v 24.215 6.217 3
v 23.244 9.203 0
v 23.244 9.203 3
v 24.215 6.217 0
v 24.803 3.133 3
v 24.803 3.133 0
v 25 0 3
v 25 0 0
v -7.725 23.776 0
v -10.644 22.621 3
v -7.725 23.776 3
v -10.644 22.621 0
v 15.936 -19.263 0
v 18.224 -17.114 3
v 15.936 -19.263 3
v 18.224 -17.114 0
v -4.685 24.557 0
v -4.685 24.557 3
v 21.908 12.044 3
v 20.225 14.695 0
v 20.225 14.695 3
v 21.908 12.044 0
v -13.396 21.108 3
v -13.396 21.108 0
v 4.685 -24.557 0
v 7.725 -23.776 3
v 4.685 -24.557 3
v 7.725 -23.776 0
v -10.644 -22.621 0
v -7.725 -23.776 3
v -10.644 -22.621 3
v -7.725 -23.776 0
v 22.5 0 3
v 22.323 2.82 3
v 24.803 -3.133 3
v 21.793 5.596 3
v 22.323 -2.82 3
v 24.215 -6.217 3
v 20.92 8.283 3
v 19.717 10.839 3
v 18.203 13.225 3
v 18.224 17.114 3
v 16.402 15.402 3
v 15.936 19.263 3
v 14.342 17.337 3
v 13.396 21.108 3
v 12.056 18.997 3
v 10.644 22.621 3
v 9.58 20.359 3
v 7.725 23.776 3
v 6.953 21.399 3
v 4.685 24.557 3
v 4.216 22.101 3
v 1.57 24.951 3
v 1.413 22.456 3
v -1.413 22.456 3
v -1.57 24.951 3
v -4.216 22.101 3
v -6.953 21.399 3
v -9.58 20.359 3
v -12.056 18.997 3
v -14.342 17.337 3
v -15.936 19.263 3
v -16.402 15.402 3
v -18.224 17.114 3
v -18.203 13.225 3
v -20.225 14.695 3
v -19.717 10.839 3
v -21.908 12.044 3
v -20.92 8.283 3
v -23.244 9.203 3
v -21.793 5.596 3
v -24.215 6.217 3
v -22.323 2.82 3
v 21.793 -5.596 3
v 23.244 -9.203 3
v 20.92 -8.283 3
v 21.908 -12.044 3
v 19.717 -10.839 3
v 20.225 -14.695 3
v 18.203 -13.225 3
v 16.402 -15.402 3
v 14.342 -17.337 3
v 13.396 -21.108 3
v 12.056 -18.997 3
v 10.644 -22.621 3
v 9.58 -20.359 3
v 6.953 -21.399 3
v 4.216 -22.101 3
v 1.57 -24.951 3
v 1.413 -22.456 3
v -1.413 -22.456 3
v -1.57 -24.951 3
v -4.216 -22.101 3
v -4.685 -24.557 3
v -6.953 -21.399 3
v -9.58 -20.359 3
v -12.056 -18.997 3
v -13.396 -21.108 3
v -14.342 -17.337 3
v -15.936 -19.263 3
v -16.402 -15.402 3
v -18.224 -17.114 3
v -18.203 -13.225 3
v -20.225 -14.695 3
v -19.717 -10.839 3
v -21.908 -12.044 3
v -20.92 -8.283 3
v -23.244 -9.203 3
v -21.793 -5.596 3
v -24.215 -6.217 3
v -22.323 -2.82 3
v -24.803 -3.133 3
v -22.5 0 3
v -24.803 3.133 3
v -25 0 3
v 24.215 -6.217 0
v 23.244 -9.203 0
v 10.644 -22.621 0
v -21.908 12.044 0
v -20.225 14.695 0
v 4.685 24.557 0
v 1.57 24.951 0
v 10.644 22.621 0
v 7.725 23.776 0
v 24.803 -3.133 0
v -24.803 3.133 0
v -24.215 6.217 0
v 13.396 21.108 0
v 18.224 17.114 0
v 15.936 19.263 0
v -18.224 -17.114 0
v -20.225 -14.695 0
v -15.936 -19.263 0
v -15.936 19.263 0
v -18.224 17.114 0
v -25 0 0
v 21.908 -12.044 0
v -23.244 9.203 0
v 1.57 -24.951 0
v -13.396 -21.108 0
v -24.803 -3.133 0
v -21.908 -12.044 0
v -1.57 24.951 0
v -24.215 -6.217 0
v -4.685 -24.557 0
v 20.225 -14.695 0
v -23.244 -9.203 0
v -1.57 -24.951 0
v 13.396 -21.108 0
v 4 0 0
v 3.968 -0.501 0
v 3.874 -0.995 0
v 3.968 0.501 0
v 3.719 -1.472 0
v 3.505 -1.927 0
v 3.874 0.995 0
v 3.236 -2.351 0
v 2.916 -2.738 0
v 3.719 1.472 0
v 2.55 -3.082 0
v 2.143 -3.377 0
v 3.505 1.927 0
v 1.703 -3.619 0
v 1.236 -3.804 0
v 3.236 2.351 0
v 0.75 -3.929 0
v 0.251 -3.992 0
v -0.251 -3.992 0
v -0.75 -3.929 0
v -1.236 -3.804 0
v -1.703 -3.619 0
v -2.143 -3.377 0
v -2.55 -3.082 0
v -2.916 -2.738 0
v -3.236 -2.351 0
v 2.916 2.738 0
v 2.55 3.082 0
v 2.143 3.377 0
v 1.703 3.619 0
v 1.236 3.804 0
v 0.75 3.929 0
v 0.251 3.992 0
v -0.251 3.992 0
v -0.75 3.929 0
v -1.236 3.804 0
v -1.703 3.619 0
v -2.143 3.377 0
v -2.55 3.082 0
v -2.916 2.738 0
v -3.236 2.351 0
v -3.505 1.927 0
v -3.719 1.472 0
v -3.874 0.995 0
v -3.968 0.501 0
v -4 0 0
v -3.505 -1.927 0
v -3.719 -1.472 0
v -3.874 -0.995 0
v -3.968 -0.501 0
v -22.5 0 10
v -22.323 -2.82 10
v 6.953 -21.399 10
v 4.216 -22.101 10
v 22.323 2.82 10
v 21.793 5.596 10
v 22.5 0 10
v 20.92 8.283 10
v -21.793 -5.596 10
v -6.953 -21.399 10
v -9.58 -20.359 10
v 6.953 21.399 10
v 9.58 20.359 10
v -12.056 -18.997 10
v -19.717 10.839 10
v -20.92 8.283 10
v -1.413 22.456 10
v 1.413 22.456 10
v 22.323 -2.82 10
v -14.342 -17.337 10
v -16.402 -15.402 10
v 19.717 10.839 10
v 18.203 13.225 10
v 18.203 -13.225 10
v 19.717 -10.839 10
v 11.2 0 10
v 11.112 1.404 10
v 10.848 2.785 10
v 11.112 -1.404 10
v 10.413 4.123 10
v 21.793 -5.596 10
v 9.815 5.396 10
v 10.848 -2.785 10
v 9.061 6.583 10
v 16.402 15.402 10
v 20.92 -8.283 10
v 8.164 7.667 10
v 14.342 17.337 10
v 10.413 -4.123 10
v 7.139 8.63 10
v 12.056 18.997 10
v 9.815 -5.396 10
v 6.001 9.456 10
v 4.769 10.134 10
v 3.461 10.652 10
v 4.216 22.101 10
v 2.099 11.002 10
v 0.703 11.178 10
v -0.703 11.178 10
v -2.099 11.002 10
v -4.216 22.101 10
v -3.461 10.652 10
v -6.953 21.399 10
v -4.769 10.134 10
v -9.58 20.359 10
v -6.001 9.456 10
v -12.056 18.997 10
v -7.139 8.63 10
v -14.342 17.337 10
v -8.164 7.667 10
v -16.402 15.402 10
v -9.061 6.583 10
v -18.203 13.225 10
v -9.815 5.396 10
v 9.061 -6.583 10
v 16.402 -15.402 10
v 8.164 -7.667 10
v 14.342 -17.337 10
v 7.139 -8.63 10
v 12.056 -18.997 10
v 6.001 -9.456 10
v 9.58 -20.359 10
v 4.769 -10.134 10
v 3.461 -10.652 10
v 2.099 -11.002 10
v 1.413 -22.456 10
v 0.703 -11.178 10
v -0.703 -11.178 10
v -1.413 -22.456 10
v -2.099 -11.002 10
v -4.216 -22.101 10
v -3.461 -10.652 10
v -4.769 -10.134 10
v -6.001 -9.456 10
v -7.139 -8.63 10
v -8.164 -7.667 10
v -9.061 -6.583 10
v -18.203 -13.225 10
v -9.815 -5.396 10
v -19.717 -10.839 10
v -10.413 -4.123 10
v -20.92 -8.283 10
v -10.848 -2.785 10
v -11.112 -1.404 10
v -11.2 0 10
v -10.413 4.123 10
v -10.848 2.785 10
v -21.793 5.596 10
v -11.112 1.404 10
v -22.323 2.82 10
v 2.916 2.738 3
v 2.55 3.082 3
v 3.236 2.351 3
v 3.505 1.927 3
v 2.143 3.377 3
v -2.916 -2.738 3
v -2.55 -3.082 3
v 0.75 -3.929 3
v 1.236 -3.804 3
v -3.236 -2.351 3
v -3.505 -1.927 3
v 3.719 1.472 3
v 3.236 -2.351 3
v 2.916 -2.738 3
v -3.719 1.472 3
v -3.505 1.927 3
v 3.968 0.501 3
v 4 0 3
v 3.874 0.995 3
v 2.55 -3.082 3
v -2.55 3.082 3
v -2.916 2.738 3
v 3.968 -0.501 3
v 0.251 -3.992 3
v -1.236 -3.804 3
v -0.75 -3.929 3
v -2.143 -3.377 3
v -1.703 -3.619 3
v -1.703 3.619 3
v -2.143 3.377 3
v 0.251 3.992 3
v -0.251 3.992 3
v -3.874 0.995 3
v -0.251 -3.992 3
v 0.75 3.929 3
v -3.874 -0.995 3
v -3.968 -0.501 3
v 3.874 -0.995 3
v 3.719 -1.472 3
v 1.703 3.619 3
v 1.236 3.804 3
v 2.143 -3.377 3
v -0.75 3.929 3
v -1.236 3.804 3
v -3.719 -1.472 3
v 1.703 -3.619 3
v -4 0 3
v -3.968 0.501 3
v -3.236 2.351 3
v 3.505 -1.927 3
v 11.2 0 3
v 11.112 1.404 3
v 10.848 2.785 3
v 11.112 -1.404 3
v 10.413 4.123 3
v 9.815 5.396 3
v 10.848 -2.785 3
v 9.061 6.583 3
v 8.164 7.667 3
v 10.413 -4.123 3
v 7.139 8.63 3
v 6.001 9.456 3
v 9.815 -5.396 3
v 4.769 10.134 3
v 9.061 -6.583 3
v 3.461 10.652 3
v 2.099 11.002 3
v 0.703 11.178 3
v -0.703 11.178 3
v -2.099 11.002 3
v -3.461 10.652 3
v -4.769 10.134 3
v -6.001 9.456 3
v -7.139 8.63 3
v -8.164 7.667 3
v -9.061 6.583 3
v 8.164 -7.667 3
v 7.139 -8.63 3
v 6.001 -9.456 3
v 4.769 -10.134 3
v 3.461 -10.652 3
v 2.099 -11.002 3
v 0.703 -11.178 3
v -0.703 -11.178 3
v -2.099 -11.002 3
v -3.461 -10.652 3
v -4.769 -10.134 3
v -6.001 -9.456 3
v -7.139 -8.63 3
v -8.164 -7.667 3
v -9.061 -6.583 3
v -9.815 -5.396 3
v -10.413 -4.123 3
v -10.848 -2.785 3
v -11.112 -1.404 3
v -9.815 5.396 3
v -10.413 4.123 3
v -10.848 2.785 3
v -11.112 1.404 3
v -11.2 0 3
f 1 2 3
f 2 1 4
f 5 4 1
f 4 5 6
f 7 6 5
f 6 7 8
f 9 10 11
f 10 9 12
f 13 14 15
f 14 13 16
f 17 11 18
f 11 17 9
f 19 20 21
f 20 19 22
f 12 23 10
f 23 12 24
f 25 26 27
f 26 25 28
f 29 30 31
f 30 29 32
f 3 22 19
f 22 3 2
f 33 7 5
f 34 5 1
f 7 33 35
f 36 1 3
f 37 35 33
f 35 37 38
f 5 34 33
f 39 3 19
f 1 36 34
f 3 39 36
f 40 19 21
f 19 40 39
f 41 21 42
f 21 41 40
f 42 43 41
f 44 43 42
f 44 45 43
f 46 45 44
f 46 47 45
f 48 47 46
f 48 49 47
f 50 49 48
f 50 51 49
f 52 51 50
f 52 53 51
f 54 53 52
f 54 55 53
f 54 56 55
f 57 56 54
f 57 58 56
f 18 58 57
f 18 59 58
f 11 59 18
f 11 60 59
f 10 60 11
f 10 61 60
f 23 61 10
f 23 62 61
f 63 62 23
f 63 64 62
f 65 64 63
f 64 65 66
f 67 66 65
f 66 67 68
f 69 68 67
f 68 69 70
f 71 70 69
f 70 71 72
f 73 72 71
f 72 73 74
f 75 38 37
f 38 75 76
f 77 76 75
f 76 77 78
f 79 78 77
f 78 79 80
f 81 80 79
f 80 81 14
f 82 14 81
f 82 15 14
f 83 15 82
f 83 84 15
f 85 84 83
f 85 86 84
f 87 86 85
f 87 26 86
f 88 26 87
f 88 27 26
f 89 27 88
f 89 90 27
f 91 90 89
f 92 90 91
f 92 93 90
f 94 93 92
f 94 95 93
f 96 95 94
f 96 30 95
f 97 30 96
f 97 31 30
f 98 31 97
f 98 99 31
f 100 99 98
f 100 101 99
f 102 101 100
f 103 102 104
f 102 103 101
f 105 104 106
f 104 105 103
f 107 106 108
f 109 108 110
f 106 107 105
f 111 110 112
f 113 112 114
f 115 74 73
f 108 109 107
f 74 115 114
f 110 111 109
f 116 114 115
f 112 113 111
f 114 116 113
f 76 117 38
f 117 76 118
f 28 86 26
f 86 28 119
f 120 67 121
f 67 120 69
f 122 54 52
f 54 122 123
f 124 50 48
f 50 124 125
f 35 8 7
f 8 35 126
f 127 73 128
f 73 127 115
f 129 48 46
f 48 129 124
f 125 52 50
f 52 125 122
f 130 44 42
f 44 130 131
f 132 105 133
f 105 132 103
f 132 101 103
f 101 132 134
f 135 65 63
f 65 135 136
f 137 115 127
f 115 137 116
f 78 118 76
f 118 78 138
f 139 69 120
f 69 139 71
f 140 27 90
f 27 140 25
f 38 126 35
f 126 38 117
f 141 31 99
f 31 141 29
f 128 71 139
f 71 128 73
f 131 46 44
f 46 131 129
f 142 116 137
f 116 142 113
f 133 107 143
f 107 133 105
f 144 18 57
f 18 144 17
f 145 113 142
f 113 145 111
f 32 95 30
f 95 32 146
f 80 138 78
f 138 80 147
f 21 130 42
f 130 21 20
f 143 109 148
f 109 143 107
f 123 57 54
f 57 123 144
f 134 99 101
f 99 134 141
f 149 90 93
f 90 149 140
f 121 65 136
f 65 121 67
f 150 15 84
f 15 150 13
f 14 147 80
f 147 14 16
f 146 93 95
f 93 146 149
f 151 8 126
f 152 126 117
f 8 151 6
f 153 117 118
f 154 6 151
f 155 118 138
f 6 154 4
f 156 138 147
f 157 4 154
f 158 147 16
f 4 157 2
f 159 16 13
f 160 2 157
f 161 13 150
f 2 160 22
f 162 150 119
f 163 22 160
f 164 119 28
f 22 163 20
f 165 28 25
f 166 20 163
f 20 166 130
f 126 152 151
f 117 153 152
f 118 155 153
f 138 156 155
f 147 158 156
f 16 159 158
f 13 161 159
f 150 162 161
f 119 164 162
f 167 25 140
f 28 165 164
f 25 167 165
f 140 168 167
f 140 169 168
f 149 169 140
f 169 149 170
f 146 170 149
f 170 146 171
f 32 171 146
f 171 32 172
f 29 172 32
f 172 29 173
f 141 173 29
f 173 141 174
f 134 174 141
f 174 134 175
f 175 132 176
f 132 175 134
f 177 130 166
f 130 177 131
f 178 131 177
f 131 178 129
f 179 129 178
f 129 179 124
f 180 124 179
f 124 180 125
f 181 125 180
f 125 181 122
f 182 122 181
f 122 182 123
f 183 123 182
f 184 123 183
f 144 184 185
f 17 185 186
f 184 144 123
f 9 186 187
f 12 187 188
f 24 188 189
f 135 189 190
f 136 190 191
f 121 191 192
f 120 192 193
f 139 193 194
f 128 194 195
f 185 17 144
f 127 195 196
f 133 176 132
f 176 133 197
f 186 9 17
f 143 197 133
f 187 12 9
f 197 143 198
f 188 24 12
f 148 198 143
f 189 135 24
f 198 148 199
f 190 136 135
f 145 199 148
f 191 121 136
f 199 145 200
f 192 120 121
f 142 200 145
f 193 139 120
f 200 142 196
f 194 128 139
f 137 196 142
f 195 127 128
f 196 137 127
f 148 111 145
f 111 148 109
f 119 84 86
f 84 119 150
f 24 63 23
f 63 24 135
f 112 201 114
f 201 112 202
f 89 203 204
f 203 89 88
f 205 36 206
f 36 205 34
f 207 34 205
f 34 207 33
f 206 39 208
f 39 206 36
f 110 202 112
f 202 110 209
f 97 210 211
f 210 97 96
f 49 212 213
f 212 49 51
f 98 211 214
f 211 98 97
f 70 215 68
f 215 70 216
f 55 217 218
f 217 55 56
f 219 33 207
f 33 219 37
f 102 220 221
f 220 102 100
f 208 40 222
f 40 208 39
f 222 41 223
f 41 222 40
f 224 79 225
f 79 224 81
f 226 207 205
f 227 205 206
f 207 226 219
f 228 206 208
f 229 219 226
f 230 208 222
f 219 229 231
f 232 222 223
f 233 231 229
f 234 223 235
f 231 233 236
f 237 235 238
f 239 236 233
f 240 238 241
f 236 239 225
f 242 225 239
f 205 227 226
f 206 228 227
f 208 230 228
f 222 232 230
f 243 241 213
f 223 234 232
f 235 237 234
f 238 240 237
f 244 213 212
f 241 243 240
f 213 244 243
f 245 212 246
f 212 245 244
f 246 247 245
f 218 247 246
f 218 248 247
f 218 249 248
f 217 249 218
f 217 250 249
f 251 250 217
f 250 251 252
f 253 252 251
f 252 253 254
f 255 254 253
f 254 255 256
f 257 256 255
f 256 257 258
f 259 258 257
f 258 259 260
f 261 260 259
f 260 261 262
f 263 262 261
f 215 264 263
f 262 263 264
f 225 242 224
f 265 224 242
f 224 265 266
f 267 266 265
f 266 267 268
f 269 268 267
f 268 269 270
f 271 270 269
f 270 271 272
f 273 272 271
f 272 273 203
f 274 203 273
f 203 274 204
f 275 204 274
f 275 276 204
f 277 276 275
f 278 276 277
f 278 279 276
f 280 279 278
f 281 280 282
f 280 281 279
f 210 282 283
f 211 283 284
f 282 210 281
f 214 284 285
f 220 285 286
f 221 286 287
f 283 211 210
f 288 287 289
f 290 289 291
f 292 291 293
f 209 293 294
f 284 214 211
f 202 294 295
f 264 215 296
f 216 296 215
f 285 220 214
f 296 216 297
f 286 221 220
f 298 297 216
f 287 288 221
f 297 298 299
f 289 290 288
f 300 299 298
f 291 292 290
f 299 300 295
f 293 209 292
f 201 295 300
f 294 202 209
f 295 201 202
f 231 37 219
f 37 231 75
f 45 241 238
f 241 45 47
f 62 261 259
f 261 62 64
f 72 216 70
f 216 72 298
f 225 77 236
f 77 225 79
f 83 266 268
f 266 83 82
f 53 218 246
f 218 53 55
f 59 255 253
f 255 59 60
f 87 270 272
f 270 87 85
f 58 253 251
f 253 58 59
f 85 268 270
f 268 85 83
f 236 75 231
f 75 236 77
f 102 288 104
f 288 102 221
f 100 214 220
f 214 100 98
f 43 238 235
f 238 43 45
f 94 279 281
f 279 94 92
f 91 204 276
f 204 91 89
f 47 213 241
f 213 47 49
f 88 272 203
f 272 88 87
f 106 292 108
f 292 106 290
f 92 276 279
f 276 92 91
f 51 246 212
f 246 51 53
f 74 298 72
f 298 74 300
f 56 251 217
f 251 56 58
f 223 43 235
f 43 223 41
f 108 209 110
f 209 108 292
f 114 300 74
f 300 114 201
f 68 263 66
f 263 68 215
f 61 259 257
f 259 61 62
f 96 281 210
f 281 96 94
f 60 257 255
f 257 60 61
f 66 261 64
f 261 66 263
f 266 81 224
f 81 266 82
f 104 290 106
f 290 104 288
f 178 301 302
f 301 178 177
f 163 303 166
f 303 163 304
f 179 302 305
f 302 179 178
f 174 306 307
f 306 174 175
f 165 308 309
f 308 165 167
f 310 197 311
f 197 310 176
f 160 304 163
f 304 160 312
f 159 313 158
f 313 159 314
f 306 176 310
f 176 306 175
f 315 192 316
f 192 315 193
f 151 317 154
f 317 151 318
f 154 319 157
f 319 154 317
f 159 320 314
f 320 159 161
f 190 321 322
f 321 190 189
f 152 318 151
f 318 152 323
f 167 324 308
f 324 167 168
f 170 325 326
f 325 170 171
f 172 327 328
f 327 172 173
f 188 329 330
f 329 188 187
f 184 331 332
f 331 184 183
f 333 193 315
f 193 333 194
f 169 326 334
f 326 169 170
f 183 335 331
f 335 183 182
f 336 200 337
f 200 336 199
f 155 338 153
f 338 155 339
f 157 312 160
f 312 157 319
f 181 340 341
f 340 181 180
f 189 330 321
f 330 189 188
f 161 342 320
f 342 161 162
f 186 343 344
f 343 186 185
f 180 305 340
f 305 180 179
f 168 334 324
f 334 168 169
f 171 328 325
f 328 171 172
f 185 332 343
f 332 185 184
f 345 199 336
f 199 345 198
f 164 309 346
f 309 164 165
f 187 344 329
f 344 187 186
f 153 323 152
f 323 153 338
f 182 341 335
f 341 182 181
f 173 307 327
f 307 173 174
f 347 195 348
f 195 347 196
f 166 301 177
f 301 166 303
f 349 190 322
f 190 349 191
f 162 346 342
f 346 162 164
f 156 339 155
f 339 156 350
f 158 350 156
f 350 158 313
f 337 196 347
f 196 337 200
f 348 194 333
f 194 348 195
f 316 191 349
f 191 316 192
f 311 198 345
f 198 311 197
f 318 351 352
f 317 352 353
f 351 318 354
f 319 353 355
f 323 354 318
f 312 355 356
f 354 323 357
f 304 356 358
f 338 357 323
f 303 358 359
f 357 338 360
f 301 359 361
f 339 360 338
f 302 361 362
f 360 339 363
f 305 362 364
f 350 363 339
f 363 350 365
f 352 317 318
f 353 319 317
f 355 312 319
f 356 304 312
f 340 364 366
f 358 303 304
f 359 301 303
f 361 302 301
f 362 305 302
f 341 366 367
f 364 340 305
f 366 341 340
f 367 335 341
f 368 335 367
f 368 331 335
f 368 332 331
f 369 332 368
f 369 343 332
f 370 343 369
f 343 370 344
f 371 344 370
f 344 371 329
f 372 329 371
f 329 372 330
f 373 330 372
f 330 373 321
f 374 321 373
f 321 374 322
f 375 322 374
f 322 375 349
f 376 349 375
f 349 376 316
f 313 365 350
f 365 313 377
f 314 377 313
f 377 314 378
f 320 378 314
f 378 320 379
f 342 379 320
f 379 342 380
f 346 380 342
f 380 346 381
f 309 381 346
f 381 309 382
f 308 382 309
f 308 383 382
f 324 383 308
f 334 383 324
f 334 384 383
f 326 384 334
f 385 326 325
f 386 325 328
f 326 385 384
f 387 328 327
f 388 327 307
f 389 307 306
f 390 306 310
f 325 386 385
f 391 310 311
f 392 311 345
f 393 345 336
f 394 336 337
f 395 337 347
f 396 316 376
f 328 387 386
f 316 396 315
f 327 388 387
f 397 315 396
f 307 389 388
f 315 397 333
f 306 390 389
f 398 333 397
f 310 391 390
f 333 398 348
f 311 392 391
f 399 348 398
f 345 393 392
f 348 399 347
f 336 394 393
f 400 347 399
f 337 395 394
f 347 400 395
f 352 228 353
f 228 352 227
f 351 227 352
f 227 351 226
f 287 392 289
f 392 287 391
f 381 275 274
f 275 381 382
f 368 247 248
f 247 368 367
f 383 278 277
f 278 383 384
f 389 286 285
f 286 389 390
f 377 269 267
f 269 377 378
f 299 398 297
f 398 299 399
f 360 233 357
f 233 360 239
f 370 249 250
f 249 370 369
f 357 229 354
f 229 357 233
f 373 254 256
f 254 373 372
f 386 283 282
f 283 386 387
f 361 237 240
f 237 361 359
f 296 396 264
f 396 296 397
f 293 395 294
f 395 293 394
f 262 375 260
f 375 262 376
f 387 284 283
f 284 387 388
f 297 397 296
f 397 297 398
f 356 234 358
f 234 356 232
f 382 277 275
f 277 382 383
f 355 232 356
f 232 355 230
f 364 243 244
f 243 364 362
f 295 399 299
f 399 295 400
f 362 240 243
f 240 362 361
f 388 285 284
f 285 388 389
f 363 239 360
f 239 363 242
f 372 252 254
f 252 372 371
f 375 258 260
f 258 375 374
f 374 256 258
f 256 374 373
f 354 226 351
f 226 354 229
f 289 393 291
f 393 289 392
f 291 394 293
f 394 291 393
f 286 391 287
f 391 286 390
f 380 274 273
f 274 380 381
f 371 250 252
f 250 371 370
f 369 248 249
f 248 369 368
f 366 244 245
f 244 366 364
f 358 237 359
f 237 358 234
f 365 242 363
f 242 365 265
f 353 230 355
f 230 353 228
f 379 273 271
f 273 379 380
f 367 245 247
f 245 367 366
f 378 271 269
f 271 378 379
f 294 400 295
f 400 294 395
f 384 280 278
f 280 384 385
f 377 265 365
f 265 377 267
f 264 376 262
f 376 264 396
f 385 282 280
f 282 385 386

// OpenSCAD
inner_diameter = 45.0; //[24:0.1:70]
bearing_style = 1; //[1:Inside, 2:Outside]
bearing_fit = 11.2; //[11.2:Normal, 11:Tight]

inner_rad = inner_diameter/2;
outer_diameter = inner_diameter + 5;
outer_rad = outer_diameter/2;

difference() {
    
    union() {
        cylinder(3,outer_rad,outer_rad,false,$fn=50);
        translate ([0,0,3]) {
            cylinder(7,inner_rad,inner_rad,false,$fn=50);
        }
    };
    
    union() {
        if (bearing_style == 2) {
            cylinder(7,bearing_fit,bearing_fit,false,$fn=50);
            translate ([0,0,7]) {
                cylinder(3,4,4,false,$fn=50);
            }
        } else {
            cylinder(3,4,4,false,$fn=50);
            translate ([0,0,3]) {
                cylinder(7,bearing_fit,bearing_fit,false,$fn=50);
            }
        };
    };
}
